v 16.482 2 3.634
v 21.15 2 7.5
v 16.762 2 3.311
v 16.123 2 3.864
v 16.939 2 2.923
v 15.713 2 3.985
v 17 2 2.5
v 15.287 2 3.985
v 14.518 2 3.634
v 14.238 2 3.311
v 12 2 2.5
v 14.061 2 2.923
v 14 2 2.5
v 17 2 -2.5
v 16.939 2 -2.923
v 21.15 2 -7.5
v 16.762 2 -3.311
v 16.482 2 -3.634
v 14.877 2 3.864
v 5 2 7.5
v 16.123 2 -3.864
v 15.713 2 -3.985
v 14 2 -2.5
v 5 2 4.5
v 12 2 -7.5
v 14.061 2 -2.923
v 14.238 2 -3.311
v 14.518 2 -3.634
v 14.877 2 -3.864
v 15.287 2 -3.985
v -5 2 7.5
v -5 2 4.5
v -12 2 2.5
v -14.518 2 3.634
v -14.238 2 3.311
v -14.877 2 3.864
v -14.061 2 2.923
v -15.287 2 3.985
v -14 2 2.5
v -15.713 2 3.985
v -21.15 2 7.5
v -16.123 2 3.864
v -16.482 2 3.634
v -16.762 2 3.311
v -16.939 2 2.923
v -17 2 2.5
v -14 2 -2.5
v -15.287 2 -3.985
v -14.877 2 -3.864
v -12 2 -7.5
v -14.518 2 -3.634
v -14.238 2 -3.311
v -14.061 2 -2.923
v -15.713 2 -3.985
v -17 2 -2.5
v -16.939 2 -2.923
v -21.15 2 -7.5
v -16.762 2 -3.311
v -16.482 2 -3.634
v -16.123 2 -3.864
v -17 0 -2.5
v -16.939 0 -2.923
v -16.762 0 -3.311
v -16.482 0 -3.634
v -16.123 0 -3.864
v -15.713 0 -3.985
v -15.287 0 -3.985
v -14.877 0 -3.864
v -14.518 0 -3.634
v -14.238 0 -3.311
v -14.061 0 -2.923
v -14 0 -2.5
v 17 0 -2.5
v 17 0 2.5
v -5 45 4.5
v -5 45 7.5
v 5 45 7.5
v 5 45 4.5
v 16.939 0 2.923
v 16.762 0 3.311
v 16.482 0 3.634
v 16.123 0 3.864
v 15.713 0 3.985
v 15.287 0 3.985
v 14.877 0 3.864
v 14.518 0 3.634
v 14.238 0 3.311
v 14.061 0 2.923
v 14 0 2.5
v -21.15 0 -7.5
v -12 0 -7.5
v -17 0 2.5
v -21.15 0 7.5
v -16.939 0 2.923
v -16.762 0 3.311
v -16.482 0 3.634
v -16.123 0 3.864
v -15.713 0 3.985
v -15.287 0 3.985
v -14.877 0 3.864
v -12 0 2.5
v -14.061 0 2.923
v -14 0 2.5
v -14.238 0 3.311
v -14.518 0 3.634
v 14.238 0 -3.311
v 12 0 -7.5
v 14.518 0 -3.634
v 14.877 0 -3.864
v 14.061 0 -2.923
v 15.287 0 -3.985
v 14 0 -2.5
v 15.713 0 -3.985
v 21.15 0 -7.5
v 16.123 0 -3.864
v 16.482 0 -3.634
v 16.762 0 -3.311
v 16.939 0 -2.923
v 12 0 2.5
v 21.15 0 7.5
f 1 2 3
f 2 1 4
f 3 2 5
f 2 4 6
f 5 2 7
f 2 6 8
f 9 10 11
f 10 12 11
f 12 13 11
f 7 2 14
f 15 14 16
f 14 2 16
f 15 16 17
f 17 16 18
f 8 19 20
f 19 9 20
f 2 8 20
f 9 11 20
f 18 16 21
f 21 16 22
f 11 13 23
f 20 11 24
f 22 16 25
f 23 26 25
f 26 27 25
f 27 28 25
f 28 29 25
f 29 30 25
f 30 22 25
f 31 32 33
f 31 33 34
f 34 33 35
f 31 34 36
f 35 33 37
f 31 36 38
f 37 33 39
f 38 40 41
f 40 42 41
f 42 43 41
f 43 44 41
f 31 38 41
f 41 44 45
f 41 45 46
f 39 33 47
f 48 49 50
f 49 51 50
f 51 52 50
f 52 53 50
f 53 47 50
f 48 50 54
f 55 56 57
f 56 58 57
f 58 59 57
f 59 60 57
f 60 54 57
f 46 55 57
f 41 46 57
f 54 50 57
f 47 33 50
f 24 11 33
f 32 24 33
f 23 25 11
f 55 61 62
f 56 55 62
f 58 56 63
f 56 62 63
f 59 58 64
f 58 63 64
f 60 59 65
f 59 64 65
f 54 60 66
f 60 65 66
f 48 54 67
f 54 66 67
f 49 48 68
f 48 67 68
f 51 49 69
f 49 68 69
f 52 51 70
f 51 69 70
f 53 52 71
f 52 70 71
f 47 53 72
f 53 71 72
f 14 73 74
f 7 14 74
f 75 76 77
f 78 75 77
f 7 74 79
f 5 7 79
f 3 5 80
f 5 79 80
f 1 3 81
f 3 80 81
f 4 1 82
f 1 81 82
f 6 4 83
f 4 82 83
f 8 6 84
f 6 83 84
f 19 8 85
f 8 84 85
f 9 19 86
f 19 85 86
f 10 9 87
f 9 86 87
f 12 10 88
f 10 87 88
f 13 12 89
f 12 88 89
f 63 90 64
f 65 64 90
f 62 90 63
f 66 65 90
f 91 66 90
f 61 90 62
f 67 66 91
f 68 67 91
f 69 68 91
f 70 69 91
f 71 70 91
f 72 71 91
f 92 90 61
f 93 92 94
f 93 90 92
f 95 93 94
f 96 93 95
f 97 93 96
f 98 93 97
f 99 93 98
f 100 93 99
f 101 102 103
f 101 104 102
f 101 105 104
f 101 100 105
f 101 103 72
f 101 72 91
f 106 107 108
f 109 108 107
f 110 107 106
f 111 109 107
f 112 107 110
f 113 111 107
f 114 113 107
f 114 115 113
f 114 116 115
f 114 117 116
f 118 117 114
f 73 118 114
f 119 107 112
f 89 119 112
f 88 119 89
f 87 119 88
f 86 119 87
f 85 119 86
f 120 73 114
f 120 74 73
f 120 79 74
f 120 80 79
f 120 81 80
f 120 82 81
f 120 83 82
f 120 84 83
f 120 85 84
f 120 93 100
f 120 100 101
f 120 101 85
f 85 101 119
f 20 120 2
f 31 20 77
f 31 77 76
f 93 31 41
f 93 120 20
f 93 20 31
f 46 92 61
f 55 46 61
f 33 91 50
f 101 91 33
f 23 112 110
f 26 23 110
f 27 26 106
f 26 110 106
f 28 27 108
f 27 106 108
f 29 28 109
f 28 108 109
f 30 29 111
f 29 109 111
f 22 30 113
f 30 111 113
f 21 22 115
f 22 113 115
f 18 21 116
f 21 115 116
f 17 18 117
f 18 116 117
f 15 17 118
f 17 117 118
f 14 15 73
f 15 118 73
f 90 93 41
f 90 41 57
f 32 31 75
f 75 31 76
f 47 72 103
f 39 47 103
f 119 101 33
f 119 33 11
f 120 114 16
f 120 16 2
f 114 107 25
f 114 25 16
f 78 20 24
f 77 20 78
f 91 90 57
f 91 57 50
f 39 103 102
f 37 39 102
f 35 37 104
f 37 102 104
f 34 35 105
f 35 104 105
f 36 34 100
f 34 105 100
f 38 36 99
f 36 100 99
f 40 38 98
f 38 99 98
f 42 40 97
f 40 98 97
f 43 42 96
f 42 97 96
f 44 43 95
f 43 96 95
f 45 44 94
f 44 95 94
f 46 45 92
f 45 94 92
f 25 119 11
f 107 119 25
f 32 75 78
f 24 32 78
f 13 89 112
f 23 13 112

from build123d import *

# Parameters (mm, degrees)
DODANIE_WYCI_GNI_CIE1_DEPTH = 2
SZKIC4_W                    = 10
SZKIC4_H                    = 45
DODANIE_WYCI_GNI_CIE2_DEPTH = 3


with BuildPart() as part:
    # Szkic1 → Dodanie-wyciągnięcie1 (new body)
    with BuildSketch(Plane(origin=(0, 0, 0), x_dir=(1, 0, 0), z_dir=(0, 1, 0))):
        Polygon((-21.15, 7.5), (-12, 7.5), (-12, -2.5), (12, -2.5), (12, 7.5), (21.15, 7.5), (21.15, -7.5), (-21.15, -7.5), align=None)
        with BuildLine():
            Line((-14, 2.5), (-14, -2.5))
            ThreePointArc((-14, -2.5), (-15.5, -4), (-17, -2.5))
            Line((-17, -2.5), (-17, 2.5))
            ThreePointArc((-17, 2.5), (-15.5, 4), (-14, 2.5))
        make_face(mode=Mode.SUBTRACT)
        with BuildLine():
            Line((17, 2.5), (17, -2.5))
            ThreePointArc((17, -2.5), (15.5, -4), (14, -2.5))
            Line((14, -2.5), (14, 2.5))
            ThreePointArc((14, 2.5), (15.5, 4), (17, 2.5))
        make_face(mode=Mode.SUBTRACT)
    extrude(amount=DODANIE_WYCI_GNI_CIE1_DEPTH)

    # Szkic4 → Dodanie-wyciągnięcie2 (add)
    with BuildSketch(Plane.XY.offset(7.5)):
        with Locations((0, 22.5)):
            Rectangle(SZKIC4_W, SZKIC4_H)
    extrude(amount=-DODANIE_WYCI_GNI_CIE2_DEPTH)


solid = part.part
